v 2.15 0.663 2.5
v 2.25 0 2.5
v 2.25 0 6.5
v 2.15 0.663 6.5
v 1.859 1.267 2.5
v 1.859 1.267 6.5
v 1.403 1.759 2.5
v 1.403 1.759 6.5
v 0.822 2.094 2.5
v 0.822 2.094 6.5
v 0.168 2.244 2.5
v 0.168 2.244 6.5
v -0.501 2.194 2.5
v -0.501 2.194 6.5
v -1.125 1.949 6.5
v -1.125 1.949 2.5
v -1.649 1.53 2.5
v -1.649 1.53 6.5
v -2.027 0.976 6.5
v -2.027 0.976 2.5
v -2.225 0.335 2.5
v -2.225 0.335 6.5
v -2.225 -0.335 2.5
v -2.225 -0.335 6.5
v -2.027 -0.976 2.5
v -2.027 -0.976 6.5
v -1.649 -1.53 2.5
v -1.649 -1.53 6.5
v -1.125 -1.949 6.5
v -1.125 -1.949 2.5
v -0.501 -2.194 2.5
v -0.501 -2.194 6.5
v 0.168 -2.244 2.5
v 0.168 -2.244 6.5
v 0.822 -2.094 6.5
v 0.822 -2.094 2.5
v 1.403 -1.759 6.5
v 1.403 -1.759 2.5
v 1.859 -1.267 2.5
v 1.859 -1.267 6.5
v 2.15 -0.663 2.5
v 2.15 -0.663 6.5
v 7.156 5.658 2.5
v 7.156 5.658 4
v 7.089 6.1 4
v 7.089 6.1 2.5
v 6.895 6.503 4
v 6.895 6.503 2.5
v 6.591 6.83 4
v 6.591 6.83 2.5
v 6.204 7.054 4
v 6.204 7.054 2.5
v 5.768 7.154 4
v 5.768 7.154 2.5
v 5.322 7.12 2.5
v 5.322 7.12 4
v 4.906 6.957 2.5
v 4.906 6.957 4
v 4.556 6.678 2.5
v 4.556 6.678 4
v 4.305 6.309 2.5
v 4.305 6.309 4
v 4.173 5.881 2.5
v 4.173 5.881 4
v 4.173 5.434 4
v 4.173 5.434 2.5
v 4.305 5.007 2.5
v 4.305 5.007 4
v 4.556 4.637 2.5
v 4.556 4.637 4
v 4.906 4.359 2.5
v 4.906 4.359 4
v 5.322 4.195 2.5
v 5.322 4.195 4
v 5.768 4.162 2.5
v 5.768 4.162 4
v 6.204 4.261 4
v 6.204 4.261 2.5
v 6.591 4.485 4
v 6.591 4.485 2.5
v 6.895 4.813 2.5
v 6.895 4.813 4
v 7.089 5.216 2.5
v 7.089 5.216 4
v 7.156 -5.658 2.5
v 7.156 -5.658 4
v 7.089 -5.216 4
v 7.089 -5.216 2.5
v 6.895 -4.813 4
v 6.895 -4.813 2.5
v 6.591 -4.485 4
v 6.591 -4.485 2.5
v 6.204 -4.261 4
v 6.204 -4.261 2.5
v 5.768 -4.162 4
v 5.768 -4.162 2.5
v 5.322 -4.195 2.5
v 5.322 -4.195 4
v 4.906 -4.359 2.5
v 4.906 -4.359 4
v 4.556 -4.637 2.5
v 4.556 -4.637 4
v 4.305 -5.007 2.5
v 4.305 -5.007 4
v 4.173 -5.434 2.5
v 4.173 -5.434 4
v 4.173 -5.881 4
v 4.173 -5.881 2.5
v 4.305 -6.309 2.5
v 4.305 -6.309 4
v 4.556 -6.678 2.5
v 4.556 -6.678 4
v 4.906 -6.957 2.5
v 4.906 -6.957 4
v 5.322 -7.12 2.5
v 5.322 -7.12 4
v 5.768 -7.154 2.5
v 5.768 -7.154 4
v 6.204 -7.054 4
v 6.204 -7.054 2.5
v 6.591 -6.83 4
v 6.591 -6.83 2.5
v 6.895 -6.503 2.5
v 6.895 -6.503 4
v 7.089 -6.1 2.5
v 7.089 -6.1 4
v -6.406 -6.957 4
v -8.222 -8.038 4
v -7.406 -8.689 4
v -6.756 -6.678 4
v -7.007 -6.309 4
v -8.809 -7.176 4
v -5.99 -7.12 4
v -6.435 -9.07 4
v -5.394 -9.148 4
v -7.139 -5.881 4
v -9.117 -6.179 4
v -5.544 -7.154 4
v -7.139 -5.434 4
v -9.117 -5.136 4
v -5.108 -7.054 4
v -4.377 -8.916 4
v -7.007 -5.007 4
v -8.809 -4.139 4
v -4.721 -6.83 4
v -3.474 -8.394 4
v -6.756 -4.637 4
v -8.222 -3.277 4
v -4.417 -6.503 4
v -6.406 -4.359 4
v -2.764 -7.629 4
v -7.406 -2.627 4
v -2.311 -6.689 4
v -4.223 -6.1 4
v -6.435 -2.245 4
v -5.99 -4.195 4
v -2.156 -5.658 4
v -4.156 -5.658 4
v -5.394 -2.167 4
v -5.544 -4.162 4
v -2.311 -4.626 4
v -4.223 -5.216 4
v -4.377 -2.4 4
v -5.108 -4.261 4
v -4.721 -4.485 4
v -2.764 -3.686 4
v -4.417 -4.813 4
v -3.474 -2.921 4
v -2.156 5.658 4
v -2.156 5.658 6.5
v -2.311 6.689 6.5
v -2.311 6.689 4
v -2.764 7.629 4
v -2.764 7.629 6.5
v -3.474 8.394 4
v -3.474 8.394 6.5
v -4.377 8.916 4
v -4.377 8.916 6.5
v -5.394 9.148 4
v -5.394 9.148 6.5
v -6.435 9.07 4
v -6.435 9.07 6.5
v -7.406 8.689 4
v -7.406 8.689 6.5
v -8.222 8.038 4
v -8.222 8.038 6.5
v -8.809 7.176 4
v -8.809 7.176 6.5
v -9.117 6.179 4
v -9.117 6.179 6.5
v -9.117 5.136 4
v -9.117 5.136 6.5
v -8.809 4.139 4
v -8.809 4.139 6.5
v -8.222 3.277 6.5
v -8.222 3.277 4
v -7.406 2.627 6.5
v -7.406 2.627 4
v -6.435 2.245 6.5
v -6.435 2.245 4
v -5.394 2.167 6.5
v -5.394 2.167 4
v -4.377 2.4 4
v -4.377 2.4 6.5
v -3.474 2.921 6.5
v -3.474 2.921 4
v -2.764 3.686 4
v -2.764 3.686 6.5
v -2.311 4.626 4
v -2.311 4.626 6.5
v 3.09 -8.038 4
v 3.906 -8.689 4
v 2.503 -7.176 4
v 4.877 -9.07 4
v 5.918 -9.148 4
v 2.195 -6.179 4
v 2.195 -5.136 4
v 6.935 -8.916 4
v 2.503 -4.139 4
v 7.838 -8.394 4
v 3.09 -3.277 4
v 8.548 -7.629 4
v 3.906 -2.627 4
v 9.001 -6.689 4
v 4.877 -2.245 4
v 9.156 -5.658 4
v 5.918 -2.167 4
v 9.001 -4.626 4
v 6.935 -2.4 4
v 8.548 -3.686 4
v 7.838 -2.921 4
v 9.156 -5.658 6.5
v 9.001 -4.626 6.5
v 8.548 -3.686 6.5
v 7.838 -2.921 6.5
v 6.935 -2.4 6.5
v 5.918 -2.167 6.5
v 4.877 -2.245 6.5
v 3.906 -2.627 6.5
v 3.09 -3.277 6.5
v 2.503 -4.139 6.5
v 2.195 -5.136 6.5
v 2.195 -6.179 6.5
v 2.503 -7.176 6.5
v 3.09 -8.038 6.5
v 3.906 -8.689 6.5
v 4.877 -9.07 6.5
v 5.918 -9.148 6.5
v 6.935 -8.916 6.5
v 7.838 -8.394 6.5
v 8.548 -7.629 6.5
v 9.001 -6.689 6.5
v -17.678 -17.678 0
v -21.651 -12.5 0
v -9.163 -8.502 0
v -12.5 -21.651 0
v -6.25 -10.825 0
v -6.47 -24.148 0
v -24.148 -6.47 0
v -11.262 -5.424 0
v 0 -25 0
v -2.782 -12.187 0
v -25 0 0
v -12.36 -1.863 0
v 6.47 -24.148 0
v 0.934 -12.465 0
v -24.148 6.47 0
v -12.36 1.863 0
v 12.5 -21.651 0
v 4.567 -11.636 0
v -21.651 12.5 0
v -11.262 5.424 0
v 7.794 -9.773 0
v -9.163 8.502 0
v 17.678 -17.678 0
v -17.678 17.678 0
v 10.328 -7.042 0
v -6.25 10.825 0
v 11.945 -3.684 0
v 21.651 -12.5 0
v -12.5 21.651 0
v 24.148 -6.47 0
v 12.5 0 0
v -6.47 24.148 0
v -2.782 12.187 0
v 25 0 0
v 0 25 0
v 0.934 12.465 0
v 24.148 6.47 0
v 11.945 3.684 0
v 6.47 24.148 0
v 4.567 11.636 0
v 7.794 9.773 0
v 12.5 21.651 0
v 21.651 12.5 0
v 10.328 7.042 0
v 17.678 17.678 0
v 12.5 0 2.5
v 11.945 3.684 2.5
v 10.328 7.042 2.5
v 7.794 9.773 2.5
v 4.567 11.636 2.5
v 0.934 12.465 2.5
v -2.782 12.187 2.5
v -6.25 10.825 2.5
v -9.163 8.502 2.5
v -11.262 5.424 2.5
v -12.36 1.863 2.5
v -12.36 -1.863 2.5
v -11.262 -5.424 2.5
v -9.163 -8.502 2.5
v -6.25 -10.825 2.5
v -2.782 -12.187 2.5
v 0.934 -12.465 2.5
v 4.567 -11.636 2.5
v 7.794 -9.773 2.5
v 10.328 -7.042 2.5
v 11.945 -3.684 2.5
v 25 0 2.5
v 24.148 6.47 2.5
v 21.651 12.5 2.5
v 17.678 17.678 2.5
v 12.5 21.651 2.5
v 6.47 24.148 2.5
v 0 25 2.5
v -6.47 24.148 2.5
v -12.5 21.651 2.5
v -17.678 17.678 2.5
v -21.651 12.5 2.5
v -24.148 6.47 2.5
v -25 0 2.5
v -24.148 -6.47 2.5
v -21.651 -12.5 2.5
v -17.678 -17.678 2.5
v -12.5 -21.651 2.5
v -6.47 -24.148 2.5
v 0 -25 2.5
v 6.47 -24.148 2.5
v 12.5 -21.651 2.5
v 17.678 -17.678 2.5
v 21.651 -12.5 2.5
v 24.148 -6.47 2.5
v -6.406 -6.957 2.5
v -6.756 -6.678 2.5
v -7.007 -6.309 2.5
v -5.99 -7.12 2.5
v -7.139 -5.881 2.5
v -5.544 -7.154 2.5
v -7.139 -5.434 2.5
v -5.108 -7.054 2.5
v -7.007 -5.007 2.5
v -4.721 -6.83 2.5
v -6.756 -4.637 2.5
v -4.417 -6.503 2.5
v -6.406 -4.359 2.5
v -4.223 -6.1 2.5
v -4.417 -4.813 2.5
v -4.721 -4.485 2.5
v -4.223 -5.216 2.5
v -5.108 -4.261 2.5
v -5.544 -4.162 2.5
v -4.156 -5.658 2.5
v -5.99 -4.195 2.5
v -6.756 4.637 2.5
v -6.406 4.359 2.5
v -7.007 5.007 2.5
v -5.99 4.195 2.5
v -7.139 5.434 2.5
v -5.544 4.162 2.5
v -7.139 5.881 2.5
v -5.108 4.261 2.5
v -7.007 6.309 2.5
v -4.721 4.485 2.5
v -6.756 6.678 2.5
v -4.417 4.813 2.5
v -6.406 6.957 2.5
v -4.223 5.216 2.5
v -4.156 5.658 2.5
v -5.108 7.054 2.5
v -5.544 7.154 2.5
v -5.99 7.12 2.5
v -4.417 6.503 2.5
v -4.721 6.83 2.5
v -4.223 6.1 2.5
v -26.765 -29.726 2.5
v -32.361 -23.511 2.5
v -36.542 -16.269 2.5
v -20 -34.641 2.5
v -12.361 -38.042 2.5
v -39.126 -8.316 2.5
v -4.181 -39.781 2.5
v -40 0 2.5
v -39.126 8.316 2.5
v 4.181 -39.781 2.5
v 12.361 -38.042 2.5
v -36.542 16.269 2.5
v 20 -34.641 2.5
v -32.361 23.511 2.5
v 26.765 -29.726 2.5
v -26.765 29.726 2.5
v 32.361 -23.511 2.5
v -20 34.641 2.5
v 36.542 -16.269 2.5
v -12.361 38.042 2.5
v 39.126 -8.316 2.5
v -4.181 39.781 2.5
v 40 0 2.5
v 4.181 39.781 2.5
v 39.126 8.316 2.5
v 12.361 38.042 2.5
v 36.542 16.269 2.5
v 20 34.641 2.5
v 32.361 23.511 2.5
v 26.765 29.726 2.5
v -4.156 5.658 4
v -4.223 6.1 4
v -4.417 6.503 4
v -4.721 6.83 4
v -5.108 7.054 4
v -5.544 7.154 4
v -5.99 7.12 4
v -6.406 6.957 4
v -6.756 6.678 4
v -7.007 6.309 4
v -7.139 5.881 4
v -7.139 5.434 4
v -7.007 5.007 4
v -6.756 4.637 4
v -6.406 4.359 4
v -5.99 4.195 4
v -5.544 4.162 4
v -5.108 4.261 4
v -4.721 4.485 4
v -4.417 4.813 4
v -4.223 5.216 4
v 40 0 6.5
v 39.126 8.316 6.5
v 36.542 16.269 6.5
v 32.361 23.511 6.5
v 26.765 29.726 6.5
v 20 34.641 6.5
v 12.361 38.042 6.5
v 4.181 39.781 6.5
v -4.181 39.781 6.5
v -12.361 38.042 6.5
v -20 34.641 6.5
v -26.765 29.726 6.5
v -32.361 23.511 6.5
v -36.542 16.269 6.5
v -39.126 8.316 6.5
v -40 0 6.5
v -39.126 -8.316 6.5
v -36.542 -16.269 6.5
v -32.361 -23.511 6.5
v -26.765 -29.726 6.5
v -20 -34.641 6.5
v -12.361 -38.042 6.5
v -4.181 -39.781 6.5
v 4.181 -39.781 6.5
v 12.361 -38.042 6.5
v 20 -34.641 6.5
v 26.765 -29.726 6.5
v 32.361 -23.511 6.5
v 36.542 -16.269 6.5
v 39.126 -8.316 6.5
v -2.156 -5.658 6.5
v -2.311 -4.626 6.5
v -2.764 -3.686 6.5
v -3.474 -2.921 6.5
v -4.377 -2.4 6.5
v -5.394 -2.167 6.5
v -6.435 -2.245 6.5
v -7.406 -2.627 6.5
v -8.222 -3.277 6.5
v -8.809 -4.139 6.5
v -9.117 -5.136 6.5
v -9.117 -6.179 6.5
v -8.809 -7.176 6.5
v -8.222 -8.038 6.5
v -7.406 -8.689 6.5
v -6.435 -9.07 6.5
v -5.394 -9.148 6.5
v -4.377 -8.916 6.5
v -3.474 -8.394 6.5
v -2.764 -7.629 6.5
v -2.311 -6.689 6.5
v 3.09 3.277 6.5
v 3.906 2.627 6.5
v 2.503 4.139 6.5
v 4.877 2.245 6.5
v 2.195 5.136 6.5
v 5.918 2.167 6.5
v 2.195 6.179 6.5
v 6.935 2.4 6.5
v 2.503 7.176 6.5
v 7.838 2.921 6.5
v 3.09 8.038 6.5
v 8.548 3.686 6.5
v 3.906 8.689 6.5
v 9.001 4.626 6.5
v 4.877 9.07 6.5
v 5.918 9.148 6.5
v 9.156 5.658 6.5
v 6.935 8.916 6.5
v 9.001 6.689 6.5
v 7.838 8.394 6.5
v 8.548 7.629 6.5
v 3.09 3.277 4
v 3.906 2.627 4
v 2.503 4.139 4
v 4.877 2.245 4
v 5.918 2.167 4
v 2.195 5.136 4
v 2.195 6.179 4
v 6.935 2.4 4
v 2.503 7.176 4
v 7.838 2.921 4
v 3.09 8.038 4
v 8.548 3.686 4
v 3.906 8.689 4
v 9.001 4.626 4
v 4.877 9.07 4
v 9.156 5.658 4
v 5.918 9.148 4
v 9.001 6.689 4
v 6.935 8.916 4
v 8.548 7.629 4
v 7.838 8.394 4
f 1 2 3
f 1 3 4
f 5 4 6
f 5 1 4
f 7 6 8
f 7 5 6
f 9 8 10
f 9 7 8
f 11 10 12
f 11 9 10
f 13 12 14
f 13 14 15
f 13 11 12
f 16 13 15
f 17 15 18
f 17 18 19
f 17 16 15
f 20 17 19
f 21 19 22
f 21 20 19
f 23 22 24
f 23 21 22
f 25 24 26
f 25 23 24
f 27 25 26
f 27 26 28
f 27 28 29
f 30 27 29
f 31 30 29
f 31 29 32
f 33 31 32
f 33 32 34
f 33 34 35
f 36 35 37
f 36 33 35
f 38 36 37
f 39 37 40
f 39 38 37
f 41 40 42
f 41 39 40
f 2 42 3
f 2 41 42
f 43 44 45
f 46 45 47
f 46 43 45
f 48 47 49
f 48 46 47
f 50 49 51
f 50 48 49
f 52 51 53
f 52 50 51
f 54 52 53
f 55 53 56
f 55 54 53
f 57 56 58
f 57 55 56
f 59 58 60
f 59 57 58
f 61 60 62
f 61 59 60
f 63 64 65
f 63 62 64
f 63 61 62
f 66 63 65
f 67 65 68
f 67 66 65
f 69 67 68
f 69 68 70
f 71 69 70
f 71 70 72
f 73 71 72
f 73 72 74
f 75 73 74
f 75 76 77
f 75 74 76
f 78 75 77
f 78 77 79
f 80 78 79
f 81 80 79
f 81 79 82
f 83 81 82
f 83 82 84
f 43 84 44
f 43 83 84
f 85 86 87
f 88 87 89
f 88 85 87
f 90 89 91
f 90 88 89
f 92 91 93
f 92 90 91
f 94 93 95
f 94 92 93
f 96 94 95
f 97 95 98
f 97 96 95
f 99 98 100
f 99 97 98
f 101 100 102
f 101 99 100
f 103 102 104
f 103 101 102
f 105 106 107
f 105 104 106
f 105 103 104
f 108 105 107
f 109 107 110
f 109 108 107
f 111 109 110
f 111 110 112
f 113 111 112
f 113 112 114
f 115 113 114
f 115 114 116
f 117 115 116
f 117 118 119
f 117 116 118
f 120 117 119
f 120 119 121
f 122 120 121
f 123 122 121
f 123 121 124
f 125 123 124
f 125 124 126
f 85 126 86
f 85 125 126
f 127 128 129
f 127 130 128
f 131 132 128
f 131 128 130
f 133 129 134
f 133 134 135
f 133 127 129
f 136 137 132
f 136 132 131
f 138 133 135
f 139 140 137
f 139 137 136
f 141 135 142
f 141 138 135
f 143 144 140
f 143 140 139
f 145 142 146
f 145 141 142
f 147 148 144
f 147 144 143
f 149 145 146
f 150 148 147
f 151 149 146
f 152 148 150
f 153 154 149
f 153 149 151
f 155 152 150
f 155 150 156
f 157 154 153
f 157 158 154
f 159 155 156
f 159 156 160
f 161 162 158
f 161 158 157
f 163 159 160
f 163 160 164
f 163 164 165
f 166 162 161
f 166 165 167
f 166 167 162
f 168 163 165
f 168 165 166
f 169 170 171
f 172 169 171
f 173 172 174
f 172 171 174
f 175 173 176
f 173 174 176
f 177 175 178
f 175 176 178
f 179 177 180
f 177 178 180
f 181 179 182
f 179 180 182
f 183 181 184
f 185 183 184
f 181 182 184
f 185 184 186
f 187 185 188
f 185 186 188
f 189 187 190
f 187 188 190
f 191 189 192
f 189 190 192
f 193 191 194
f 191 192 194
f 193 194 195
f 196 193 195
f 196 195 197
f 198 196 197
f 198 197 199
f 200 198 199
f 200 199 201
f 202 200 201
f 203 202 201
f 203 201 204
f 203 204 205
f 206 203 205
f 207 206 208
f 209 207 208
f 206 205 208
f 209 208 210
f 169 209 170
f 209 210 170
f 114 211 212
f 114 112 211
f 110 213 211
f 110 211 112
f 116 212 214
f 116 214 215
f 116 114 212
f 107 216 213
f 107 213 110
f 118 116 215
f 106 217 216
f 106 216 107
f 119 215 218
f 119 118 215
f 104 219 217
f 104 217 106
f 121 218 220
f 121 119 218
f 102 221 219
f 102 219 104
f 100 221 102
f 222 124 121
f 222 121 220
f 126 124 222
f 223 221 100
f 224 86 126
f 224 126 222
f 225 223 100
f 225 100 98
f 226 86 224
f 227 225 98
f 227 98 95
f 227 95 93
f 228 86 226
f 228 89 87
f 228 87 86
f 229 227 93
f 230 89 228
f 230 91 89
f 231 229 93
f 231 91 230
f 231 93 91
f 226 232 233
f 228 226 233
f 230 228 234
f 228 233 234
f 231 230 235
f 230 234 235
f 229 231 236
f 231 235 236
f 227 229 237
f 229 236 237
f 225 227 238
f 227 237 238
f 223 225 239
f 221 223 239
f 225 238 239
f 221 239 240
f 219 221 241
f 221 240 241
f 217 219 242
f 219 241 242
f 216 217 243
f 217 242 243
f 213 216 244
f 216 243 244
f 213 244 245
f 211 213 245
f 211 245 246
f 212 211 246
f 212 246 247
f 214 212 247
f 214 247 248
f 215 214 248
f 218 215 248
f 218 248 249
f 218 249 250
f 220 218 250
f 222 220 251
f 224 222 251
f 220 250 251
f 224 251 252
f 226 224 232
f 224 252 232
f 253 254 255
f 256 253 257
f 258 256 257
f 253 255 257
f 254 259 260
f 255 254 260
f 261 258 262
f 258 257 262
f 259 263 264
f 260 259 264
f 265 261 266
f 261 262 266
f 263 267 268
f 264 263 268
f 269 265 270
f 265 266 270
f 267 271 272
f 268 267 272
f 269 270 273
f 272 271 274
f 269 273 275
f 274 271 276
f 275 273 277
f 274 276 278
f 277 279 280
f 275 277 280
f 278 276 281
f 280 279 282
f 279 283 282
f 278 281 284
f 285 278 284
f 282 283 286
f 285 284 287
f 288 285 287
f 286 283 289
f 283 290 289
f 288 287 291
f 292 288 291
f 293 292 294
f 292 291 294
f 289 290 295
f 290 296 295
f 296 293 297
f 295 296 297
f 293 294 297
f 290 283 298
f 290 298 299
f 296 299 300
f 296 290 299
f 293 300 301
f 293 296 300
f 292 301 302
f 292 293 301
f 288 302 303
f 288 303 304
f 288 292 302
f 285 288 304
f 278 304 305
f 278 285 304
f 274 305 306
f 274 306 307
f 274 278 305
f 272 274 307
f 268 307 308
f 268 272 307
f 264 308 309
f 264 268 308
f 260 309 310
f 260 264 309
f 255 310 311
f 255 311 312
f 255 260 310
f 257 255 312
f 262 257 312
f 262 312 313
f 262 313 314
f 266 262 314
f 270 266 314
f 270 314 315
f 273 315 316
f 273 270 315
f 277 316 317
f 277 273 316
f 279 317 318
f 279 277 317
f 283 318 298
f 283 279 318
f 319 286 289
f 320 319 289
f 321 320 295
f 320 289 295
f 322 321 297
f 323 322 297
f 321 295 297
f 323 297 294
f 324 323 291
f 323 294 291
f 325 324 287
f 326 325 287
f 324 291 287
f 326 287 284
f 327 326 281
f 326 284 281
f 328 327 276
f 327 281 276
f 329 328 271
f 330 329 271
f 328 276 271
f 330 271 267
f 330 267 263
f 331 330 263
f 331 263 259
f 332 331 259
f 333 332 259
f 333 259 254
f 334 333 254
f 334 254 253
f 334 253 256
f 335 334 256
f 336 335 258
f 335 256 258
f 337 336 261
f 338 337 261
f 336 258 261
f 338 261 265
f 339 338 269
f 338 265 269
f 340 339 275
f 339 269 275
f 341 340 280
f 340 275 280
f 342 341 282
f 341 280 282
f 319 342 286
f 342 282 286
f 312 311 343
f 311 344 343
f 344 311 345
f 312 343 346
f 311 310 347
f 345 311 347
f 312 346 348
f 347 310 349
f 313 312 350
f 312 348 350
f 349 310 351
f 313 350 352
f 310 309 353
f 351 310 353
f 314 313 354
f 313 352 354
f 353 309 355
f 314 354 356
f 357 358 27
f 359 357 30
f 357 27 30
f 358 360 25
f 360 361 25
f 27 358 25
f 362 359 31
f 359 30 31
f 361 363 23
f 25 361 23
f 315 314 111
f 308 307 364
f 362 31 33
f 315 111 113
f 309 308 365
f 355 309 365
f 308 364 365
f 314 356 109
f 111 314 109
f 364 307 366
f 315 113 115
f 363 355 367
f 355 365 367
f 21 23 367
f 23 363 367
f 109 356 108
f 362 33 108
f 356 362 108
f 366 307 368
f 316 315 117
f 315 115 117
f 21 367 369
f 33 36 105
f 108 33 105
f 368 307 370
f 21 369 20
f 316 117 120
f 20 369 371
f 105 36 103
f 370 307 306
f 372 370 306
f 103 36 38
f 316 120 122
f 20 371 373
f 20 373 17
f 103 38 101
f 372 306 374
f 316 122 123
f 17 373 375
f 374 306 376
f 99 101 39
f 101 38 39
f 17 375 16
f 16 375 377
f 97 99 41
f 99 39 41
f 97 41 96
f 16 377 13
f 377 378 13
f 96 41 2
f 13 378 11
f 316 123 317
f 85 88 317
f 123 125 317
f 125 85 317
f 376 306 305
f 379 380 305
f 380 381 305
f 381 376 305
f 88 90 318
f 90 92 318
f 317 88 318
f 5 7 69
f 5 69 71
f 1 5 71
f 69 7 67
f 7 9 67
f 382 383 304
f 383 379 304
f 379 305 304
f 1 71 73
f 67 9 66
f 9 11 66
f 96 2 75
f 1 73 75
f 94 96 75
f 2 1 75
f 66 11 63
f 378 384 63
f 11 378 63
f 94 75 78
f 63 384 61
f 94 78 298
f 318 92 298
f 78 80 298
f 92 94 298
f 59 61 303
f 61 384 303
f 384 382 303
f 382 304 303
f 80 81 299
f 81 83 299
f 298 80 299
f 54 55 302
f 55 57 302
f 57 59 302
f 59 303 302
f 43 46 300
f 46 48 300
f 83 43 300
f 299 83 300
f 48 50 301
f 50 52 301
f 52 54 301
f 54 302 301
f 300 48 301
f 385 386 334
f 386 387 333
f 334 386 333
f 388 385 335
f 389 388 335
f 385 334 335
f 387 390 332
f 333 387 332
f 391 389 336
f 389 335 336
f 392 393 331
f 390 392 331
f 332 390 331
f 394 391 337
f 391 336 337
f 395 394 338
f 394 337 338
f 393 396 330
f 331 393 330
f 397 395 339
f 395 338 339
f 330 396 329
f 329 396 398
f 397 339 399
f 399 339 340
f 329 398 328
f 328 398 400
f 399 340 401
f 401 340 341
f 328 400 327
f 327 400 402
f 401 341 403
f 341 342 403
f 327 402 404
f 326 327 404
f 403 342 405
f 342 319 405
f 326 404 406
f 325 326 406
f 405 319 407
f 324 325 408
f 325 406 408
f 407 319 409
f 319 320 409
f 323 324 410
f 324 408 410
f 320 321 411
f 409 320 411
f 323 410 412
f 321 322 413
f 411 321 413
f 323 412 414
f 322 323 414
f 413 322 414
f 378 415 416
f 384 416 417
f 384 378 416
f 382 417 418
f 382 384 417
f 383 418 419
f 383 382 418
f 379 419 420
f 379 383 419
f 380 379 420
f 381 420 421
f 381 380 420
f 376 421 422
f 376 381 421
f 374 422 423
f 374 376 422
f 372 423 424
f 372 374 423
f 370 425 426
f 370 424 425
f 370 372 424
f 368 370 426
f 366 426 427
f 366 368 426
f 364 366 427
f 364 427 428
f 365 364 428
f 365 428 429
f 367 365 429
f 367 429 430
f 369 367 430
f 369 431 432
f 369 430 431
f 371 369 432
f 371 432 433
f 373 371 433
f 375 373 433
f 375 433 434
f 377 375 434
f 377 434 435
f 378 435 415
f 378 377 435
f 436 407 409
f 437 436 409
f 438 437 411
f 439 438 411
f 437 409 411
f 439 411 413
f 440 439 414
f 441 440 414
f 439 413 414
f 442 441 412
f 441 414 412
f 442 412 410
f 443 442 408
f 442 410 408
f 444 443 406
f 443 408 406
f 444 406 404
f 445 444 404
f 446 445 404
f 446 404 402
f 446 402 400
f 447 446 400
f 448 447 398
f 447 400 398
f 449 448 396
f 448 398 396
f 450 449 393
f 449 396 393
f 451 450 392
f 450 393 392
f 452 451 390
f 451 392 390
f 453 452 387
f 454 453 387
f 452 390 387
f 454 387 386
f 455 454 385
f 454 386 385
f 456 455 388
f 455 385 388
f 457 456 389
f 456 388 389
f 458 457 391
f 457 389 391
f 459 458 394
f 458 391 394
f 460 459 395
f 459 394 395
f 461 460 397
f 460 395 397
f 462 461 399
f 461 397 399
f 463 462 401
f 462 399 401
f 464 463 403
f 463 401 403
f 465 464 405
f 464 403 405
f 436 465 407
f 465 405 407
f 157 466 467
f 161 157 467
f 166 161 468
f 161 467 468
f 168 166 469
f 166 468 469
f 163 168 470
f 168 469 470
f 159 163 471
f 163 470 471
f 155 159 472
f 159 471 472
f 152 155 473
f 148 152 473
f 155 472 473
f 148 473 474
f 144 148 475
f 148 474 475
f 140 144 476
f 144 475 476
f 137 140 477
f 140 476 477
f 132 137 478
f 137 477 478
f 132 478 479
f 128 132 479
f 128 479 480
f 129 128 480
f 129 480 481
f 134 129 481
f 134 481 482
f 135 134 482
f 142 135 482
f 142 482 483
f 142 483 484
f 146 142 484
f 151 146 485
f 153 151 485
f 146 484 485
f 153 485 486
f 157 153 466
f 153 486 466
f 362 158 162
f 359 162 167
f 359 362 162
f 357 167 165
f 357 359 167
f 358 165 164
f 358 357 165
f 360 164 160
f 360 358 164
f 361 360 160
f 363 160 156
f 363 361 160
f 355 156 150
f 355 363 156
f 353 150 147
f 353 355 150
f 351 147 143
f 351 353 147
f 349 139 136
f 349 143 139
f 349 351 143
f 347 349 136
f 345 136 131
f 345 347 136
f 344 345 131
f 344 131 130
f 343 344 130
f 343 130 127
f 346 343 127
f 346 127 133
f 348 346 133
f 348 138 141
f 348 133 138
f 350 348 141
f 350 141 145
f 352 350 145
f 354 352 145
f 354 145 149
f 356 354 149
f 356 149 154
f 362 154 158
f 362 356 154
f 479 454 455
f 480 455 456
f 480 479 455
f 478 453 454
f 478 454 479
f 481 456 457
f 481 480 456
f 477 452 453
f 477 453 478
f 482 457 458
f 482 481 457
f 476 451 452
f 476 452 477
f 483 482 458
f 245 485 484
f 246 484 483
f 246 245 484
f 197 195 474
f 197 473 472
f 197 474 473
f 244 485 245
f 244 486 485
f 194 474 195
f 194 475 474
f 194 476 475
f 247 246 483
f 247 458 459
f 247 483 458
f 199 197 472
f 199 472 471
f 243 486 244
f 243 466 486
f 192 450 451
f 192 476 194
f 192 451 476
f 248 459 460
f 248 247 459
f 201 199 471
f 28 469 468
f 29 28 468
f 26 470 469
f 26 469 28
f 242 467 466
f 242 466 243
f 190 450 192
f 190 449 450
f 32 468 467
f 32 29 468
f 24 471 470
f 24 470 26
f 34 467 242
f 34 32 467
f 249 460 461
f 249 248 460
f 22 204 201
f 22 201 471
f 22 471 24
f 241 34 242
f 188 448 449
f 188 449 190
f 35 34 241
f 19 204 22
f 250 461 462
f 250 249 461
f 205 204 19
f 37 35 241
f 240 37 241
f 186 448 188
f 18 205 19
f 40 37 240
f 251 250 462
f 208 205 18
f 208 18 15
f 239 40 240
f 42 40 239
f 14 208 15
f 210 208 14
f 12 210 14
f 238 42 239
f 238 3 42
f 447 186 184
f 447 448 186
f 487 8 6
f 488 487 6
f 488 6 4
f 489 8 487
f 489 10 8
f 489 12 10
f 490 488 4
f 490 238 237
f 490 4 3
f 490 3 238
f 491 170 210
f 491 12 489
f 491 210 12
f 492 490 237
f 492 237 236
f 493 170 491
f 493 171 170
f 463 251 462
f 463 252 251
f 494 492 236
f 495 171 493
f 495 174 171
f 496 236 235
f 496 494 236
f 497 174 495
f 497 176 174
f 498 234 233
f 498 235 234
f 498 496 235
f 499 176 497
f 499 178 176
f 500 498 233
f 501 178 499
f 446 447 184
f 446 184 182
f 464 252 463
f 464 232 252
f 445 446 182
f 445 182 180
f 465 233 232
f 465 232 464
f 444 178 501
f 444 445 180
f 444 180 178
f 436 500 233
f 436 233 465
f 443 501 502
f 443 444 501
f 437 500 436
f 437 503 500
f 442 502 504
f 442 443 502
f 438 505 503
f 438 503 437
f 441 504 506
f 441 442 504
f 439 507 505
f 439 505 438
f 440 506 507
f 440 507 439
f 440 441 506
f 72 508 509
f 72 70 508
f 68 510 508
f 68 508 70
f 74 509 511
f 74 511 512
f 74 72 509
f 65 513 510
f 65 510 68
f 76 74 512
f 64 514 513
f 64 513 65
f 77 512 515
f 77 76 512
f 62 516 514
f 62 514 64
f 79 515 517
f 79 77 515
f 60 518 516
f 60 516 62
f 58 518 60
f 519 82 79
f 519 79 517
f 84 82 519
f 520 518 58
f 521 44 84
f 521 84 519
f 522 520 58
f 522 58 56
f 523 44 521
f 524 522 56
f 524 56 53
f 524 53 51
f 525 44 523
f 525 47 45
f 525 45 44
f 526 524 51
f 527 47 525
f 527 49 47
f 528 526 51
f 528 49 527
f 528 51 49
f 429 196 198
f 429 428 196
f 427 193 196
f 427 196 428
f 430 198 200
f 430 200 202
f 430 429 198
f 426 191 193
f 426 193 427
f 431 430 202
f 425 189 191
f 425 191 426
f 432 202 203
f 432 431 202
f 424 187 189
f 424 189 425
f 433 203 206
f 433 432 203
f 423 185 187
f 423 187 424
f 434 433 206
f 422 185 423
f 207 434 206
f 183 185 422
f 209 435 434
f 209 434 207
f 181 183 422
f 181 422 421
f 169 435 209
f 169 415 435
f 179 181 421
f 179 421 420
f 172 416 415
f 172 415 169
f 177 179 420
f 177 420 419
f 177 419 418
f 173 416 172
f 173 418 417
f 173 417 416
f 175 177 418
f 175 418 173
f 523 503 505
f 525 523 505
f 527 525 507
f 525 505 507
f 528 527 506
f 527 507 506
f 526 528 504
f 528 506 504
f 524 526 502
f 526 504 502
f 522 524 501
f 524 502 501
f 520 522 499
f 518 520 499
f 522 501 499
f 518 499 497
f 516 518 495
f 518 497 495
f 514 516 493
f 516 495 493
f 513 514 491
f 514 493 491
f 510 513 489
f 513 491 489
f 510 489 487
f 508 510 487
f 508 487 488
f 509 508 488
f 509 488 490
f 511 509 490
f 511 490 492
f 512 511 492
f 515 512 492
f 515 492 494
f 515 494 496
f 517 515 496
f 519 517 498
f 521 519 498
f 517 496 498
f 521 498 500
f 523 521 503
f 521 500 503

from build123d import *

# Parameters (mm, degrees)
SKETCH1_R           = 25
SKETCH1_R_2         = 12.5
BOSS_EXTRUDE1_DEPTH = 2.5
SKETCH2_R           = 40
SKETCH2_R_2         = 2.25
SKETCH2_R_3         = 1.5
BOSS_EXTRUDE2_DEPTH = 4
SKETCH3_R           = 3.5
CUT_EXTRUDE1_DEPTH  = 2.5


with BuildPart() as part:
    # Sketch1 → Boss-Extrude1 (new body)
    with BuildSketch(Plane.XY):
        Circle(SKETCH1_R)
        Circle(SKETCH1_R_2, mode=Mode.SUBTRACT)
    extrude(amount=BOSS_EXTRUDE1_DEPTH)

    # Sketch2 → Boss-Extrude2 (add)
    with BuildSketch(Plane.XY.offset(2.5)):
        Circle(SKETCH2_R)
        Circle(SKETCH2_R_2, mode=Mode.SUBTRACT)
        with Locations((-5.655999742, 5.657708628)):
            Circle(SKETCH2_R_3, mode=Mode.SUBTRACT)
        with Locations((-5.655999742, -5.657708628)):
            Circle(SKETCH2_R_3, mode=Mode.SUBTRACT)
        with Locations((5.655999742, -5.657708628)):
            Circle(SKETCH2_R_3, mode=Mode.SUBTRACT)
        with Locations((5.655999742, 5.657708628)):
            Circle(SKETCH2_R_3, mode=Mode.SUBTRACT)
    extrude(amount=BOSS_EXTRUDE2_DEPTH)

    # Sketch3 → Cut-Extrude1 (cut)
    with BuildSketch(Plane.XY.offset(6.5)):
        with Locations((-5.655999742, 5.657708628)):
            Circle(SKETCH3_R)
        with Locations((5.655999742, 5.657708628)):
            Circle(SKETCH3_R)
        with Locations((5.655999742, -5.657708628)):
            Circle(SKETCH3_R)
        with Locations((-5.655999742, -5.657708628)):
            Circle(SKETCH3_R)
    extrude(amount=-CUT_EXTRUDE1_DEPTH, mode=Mode.SUBTRACT)


solid = part.part
